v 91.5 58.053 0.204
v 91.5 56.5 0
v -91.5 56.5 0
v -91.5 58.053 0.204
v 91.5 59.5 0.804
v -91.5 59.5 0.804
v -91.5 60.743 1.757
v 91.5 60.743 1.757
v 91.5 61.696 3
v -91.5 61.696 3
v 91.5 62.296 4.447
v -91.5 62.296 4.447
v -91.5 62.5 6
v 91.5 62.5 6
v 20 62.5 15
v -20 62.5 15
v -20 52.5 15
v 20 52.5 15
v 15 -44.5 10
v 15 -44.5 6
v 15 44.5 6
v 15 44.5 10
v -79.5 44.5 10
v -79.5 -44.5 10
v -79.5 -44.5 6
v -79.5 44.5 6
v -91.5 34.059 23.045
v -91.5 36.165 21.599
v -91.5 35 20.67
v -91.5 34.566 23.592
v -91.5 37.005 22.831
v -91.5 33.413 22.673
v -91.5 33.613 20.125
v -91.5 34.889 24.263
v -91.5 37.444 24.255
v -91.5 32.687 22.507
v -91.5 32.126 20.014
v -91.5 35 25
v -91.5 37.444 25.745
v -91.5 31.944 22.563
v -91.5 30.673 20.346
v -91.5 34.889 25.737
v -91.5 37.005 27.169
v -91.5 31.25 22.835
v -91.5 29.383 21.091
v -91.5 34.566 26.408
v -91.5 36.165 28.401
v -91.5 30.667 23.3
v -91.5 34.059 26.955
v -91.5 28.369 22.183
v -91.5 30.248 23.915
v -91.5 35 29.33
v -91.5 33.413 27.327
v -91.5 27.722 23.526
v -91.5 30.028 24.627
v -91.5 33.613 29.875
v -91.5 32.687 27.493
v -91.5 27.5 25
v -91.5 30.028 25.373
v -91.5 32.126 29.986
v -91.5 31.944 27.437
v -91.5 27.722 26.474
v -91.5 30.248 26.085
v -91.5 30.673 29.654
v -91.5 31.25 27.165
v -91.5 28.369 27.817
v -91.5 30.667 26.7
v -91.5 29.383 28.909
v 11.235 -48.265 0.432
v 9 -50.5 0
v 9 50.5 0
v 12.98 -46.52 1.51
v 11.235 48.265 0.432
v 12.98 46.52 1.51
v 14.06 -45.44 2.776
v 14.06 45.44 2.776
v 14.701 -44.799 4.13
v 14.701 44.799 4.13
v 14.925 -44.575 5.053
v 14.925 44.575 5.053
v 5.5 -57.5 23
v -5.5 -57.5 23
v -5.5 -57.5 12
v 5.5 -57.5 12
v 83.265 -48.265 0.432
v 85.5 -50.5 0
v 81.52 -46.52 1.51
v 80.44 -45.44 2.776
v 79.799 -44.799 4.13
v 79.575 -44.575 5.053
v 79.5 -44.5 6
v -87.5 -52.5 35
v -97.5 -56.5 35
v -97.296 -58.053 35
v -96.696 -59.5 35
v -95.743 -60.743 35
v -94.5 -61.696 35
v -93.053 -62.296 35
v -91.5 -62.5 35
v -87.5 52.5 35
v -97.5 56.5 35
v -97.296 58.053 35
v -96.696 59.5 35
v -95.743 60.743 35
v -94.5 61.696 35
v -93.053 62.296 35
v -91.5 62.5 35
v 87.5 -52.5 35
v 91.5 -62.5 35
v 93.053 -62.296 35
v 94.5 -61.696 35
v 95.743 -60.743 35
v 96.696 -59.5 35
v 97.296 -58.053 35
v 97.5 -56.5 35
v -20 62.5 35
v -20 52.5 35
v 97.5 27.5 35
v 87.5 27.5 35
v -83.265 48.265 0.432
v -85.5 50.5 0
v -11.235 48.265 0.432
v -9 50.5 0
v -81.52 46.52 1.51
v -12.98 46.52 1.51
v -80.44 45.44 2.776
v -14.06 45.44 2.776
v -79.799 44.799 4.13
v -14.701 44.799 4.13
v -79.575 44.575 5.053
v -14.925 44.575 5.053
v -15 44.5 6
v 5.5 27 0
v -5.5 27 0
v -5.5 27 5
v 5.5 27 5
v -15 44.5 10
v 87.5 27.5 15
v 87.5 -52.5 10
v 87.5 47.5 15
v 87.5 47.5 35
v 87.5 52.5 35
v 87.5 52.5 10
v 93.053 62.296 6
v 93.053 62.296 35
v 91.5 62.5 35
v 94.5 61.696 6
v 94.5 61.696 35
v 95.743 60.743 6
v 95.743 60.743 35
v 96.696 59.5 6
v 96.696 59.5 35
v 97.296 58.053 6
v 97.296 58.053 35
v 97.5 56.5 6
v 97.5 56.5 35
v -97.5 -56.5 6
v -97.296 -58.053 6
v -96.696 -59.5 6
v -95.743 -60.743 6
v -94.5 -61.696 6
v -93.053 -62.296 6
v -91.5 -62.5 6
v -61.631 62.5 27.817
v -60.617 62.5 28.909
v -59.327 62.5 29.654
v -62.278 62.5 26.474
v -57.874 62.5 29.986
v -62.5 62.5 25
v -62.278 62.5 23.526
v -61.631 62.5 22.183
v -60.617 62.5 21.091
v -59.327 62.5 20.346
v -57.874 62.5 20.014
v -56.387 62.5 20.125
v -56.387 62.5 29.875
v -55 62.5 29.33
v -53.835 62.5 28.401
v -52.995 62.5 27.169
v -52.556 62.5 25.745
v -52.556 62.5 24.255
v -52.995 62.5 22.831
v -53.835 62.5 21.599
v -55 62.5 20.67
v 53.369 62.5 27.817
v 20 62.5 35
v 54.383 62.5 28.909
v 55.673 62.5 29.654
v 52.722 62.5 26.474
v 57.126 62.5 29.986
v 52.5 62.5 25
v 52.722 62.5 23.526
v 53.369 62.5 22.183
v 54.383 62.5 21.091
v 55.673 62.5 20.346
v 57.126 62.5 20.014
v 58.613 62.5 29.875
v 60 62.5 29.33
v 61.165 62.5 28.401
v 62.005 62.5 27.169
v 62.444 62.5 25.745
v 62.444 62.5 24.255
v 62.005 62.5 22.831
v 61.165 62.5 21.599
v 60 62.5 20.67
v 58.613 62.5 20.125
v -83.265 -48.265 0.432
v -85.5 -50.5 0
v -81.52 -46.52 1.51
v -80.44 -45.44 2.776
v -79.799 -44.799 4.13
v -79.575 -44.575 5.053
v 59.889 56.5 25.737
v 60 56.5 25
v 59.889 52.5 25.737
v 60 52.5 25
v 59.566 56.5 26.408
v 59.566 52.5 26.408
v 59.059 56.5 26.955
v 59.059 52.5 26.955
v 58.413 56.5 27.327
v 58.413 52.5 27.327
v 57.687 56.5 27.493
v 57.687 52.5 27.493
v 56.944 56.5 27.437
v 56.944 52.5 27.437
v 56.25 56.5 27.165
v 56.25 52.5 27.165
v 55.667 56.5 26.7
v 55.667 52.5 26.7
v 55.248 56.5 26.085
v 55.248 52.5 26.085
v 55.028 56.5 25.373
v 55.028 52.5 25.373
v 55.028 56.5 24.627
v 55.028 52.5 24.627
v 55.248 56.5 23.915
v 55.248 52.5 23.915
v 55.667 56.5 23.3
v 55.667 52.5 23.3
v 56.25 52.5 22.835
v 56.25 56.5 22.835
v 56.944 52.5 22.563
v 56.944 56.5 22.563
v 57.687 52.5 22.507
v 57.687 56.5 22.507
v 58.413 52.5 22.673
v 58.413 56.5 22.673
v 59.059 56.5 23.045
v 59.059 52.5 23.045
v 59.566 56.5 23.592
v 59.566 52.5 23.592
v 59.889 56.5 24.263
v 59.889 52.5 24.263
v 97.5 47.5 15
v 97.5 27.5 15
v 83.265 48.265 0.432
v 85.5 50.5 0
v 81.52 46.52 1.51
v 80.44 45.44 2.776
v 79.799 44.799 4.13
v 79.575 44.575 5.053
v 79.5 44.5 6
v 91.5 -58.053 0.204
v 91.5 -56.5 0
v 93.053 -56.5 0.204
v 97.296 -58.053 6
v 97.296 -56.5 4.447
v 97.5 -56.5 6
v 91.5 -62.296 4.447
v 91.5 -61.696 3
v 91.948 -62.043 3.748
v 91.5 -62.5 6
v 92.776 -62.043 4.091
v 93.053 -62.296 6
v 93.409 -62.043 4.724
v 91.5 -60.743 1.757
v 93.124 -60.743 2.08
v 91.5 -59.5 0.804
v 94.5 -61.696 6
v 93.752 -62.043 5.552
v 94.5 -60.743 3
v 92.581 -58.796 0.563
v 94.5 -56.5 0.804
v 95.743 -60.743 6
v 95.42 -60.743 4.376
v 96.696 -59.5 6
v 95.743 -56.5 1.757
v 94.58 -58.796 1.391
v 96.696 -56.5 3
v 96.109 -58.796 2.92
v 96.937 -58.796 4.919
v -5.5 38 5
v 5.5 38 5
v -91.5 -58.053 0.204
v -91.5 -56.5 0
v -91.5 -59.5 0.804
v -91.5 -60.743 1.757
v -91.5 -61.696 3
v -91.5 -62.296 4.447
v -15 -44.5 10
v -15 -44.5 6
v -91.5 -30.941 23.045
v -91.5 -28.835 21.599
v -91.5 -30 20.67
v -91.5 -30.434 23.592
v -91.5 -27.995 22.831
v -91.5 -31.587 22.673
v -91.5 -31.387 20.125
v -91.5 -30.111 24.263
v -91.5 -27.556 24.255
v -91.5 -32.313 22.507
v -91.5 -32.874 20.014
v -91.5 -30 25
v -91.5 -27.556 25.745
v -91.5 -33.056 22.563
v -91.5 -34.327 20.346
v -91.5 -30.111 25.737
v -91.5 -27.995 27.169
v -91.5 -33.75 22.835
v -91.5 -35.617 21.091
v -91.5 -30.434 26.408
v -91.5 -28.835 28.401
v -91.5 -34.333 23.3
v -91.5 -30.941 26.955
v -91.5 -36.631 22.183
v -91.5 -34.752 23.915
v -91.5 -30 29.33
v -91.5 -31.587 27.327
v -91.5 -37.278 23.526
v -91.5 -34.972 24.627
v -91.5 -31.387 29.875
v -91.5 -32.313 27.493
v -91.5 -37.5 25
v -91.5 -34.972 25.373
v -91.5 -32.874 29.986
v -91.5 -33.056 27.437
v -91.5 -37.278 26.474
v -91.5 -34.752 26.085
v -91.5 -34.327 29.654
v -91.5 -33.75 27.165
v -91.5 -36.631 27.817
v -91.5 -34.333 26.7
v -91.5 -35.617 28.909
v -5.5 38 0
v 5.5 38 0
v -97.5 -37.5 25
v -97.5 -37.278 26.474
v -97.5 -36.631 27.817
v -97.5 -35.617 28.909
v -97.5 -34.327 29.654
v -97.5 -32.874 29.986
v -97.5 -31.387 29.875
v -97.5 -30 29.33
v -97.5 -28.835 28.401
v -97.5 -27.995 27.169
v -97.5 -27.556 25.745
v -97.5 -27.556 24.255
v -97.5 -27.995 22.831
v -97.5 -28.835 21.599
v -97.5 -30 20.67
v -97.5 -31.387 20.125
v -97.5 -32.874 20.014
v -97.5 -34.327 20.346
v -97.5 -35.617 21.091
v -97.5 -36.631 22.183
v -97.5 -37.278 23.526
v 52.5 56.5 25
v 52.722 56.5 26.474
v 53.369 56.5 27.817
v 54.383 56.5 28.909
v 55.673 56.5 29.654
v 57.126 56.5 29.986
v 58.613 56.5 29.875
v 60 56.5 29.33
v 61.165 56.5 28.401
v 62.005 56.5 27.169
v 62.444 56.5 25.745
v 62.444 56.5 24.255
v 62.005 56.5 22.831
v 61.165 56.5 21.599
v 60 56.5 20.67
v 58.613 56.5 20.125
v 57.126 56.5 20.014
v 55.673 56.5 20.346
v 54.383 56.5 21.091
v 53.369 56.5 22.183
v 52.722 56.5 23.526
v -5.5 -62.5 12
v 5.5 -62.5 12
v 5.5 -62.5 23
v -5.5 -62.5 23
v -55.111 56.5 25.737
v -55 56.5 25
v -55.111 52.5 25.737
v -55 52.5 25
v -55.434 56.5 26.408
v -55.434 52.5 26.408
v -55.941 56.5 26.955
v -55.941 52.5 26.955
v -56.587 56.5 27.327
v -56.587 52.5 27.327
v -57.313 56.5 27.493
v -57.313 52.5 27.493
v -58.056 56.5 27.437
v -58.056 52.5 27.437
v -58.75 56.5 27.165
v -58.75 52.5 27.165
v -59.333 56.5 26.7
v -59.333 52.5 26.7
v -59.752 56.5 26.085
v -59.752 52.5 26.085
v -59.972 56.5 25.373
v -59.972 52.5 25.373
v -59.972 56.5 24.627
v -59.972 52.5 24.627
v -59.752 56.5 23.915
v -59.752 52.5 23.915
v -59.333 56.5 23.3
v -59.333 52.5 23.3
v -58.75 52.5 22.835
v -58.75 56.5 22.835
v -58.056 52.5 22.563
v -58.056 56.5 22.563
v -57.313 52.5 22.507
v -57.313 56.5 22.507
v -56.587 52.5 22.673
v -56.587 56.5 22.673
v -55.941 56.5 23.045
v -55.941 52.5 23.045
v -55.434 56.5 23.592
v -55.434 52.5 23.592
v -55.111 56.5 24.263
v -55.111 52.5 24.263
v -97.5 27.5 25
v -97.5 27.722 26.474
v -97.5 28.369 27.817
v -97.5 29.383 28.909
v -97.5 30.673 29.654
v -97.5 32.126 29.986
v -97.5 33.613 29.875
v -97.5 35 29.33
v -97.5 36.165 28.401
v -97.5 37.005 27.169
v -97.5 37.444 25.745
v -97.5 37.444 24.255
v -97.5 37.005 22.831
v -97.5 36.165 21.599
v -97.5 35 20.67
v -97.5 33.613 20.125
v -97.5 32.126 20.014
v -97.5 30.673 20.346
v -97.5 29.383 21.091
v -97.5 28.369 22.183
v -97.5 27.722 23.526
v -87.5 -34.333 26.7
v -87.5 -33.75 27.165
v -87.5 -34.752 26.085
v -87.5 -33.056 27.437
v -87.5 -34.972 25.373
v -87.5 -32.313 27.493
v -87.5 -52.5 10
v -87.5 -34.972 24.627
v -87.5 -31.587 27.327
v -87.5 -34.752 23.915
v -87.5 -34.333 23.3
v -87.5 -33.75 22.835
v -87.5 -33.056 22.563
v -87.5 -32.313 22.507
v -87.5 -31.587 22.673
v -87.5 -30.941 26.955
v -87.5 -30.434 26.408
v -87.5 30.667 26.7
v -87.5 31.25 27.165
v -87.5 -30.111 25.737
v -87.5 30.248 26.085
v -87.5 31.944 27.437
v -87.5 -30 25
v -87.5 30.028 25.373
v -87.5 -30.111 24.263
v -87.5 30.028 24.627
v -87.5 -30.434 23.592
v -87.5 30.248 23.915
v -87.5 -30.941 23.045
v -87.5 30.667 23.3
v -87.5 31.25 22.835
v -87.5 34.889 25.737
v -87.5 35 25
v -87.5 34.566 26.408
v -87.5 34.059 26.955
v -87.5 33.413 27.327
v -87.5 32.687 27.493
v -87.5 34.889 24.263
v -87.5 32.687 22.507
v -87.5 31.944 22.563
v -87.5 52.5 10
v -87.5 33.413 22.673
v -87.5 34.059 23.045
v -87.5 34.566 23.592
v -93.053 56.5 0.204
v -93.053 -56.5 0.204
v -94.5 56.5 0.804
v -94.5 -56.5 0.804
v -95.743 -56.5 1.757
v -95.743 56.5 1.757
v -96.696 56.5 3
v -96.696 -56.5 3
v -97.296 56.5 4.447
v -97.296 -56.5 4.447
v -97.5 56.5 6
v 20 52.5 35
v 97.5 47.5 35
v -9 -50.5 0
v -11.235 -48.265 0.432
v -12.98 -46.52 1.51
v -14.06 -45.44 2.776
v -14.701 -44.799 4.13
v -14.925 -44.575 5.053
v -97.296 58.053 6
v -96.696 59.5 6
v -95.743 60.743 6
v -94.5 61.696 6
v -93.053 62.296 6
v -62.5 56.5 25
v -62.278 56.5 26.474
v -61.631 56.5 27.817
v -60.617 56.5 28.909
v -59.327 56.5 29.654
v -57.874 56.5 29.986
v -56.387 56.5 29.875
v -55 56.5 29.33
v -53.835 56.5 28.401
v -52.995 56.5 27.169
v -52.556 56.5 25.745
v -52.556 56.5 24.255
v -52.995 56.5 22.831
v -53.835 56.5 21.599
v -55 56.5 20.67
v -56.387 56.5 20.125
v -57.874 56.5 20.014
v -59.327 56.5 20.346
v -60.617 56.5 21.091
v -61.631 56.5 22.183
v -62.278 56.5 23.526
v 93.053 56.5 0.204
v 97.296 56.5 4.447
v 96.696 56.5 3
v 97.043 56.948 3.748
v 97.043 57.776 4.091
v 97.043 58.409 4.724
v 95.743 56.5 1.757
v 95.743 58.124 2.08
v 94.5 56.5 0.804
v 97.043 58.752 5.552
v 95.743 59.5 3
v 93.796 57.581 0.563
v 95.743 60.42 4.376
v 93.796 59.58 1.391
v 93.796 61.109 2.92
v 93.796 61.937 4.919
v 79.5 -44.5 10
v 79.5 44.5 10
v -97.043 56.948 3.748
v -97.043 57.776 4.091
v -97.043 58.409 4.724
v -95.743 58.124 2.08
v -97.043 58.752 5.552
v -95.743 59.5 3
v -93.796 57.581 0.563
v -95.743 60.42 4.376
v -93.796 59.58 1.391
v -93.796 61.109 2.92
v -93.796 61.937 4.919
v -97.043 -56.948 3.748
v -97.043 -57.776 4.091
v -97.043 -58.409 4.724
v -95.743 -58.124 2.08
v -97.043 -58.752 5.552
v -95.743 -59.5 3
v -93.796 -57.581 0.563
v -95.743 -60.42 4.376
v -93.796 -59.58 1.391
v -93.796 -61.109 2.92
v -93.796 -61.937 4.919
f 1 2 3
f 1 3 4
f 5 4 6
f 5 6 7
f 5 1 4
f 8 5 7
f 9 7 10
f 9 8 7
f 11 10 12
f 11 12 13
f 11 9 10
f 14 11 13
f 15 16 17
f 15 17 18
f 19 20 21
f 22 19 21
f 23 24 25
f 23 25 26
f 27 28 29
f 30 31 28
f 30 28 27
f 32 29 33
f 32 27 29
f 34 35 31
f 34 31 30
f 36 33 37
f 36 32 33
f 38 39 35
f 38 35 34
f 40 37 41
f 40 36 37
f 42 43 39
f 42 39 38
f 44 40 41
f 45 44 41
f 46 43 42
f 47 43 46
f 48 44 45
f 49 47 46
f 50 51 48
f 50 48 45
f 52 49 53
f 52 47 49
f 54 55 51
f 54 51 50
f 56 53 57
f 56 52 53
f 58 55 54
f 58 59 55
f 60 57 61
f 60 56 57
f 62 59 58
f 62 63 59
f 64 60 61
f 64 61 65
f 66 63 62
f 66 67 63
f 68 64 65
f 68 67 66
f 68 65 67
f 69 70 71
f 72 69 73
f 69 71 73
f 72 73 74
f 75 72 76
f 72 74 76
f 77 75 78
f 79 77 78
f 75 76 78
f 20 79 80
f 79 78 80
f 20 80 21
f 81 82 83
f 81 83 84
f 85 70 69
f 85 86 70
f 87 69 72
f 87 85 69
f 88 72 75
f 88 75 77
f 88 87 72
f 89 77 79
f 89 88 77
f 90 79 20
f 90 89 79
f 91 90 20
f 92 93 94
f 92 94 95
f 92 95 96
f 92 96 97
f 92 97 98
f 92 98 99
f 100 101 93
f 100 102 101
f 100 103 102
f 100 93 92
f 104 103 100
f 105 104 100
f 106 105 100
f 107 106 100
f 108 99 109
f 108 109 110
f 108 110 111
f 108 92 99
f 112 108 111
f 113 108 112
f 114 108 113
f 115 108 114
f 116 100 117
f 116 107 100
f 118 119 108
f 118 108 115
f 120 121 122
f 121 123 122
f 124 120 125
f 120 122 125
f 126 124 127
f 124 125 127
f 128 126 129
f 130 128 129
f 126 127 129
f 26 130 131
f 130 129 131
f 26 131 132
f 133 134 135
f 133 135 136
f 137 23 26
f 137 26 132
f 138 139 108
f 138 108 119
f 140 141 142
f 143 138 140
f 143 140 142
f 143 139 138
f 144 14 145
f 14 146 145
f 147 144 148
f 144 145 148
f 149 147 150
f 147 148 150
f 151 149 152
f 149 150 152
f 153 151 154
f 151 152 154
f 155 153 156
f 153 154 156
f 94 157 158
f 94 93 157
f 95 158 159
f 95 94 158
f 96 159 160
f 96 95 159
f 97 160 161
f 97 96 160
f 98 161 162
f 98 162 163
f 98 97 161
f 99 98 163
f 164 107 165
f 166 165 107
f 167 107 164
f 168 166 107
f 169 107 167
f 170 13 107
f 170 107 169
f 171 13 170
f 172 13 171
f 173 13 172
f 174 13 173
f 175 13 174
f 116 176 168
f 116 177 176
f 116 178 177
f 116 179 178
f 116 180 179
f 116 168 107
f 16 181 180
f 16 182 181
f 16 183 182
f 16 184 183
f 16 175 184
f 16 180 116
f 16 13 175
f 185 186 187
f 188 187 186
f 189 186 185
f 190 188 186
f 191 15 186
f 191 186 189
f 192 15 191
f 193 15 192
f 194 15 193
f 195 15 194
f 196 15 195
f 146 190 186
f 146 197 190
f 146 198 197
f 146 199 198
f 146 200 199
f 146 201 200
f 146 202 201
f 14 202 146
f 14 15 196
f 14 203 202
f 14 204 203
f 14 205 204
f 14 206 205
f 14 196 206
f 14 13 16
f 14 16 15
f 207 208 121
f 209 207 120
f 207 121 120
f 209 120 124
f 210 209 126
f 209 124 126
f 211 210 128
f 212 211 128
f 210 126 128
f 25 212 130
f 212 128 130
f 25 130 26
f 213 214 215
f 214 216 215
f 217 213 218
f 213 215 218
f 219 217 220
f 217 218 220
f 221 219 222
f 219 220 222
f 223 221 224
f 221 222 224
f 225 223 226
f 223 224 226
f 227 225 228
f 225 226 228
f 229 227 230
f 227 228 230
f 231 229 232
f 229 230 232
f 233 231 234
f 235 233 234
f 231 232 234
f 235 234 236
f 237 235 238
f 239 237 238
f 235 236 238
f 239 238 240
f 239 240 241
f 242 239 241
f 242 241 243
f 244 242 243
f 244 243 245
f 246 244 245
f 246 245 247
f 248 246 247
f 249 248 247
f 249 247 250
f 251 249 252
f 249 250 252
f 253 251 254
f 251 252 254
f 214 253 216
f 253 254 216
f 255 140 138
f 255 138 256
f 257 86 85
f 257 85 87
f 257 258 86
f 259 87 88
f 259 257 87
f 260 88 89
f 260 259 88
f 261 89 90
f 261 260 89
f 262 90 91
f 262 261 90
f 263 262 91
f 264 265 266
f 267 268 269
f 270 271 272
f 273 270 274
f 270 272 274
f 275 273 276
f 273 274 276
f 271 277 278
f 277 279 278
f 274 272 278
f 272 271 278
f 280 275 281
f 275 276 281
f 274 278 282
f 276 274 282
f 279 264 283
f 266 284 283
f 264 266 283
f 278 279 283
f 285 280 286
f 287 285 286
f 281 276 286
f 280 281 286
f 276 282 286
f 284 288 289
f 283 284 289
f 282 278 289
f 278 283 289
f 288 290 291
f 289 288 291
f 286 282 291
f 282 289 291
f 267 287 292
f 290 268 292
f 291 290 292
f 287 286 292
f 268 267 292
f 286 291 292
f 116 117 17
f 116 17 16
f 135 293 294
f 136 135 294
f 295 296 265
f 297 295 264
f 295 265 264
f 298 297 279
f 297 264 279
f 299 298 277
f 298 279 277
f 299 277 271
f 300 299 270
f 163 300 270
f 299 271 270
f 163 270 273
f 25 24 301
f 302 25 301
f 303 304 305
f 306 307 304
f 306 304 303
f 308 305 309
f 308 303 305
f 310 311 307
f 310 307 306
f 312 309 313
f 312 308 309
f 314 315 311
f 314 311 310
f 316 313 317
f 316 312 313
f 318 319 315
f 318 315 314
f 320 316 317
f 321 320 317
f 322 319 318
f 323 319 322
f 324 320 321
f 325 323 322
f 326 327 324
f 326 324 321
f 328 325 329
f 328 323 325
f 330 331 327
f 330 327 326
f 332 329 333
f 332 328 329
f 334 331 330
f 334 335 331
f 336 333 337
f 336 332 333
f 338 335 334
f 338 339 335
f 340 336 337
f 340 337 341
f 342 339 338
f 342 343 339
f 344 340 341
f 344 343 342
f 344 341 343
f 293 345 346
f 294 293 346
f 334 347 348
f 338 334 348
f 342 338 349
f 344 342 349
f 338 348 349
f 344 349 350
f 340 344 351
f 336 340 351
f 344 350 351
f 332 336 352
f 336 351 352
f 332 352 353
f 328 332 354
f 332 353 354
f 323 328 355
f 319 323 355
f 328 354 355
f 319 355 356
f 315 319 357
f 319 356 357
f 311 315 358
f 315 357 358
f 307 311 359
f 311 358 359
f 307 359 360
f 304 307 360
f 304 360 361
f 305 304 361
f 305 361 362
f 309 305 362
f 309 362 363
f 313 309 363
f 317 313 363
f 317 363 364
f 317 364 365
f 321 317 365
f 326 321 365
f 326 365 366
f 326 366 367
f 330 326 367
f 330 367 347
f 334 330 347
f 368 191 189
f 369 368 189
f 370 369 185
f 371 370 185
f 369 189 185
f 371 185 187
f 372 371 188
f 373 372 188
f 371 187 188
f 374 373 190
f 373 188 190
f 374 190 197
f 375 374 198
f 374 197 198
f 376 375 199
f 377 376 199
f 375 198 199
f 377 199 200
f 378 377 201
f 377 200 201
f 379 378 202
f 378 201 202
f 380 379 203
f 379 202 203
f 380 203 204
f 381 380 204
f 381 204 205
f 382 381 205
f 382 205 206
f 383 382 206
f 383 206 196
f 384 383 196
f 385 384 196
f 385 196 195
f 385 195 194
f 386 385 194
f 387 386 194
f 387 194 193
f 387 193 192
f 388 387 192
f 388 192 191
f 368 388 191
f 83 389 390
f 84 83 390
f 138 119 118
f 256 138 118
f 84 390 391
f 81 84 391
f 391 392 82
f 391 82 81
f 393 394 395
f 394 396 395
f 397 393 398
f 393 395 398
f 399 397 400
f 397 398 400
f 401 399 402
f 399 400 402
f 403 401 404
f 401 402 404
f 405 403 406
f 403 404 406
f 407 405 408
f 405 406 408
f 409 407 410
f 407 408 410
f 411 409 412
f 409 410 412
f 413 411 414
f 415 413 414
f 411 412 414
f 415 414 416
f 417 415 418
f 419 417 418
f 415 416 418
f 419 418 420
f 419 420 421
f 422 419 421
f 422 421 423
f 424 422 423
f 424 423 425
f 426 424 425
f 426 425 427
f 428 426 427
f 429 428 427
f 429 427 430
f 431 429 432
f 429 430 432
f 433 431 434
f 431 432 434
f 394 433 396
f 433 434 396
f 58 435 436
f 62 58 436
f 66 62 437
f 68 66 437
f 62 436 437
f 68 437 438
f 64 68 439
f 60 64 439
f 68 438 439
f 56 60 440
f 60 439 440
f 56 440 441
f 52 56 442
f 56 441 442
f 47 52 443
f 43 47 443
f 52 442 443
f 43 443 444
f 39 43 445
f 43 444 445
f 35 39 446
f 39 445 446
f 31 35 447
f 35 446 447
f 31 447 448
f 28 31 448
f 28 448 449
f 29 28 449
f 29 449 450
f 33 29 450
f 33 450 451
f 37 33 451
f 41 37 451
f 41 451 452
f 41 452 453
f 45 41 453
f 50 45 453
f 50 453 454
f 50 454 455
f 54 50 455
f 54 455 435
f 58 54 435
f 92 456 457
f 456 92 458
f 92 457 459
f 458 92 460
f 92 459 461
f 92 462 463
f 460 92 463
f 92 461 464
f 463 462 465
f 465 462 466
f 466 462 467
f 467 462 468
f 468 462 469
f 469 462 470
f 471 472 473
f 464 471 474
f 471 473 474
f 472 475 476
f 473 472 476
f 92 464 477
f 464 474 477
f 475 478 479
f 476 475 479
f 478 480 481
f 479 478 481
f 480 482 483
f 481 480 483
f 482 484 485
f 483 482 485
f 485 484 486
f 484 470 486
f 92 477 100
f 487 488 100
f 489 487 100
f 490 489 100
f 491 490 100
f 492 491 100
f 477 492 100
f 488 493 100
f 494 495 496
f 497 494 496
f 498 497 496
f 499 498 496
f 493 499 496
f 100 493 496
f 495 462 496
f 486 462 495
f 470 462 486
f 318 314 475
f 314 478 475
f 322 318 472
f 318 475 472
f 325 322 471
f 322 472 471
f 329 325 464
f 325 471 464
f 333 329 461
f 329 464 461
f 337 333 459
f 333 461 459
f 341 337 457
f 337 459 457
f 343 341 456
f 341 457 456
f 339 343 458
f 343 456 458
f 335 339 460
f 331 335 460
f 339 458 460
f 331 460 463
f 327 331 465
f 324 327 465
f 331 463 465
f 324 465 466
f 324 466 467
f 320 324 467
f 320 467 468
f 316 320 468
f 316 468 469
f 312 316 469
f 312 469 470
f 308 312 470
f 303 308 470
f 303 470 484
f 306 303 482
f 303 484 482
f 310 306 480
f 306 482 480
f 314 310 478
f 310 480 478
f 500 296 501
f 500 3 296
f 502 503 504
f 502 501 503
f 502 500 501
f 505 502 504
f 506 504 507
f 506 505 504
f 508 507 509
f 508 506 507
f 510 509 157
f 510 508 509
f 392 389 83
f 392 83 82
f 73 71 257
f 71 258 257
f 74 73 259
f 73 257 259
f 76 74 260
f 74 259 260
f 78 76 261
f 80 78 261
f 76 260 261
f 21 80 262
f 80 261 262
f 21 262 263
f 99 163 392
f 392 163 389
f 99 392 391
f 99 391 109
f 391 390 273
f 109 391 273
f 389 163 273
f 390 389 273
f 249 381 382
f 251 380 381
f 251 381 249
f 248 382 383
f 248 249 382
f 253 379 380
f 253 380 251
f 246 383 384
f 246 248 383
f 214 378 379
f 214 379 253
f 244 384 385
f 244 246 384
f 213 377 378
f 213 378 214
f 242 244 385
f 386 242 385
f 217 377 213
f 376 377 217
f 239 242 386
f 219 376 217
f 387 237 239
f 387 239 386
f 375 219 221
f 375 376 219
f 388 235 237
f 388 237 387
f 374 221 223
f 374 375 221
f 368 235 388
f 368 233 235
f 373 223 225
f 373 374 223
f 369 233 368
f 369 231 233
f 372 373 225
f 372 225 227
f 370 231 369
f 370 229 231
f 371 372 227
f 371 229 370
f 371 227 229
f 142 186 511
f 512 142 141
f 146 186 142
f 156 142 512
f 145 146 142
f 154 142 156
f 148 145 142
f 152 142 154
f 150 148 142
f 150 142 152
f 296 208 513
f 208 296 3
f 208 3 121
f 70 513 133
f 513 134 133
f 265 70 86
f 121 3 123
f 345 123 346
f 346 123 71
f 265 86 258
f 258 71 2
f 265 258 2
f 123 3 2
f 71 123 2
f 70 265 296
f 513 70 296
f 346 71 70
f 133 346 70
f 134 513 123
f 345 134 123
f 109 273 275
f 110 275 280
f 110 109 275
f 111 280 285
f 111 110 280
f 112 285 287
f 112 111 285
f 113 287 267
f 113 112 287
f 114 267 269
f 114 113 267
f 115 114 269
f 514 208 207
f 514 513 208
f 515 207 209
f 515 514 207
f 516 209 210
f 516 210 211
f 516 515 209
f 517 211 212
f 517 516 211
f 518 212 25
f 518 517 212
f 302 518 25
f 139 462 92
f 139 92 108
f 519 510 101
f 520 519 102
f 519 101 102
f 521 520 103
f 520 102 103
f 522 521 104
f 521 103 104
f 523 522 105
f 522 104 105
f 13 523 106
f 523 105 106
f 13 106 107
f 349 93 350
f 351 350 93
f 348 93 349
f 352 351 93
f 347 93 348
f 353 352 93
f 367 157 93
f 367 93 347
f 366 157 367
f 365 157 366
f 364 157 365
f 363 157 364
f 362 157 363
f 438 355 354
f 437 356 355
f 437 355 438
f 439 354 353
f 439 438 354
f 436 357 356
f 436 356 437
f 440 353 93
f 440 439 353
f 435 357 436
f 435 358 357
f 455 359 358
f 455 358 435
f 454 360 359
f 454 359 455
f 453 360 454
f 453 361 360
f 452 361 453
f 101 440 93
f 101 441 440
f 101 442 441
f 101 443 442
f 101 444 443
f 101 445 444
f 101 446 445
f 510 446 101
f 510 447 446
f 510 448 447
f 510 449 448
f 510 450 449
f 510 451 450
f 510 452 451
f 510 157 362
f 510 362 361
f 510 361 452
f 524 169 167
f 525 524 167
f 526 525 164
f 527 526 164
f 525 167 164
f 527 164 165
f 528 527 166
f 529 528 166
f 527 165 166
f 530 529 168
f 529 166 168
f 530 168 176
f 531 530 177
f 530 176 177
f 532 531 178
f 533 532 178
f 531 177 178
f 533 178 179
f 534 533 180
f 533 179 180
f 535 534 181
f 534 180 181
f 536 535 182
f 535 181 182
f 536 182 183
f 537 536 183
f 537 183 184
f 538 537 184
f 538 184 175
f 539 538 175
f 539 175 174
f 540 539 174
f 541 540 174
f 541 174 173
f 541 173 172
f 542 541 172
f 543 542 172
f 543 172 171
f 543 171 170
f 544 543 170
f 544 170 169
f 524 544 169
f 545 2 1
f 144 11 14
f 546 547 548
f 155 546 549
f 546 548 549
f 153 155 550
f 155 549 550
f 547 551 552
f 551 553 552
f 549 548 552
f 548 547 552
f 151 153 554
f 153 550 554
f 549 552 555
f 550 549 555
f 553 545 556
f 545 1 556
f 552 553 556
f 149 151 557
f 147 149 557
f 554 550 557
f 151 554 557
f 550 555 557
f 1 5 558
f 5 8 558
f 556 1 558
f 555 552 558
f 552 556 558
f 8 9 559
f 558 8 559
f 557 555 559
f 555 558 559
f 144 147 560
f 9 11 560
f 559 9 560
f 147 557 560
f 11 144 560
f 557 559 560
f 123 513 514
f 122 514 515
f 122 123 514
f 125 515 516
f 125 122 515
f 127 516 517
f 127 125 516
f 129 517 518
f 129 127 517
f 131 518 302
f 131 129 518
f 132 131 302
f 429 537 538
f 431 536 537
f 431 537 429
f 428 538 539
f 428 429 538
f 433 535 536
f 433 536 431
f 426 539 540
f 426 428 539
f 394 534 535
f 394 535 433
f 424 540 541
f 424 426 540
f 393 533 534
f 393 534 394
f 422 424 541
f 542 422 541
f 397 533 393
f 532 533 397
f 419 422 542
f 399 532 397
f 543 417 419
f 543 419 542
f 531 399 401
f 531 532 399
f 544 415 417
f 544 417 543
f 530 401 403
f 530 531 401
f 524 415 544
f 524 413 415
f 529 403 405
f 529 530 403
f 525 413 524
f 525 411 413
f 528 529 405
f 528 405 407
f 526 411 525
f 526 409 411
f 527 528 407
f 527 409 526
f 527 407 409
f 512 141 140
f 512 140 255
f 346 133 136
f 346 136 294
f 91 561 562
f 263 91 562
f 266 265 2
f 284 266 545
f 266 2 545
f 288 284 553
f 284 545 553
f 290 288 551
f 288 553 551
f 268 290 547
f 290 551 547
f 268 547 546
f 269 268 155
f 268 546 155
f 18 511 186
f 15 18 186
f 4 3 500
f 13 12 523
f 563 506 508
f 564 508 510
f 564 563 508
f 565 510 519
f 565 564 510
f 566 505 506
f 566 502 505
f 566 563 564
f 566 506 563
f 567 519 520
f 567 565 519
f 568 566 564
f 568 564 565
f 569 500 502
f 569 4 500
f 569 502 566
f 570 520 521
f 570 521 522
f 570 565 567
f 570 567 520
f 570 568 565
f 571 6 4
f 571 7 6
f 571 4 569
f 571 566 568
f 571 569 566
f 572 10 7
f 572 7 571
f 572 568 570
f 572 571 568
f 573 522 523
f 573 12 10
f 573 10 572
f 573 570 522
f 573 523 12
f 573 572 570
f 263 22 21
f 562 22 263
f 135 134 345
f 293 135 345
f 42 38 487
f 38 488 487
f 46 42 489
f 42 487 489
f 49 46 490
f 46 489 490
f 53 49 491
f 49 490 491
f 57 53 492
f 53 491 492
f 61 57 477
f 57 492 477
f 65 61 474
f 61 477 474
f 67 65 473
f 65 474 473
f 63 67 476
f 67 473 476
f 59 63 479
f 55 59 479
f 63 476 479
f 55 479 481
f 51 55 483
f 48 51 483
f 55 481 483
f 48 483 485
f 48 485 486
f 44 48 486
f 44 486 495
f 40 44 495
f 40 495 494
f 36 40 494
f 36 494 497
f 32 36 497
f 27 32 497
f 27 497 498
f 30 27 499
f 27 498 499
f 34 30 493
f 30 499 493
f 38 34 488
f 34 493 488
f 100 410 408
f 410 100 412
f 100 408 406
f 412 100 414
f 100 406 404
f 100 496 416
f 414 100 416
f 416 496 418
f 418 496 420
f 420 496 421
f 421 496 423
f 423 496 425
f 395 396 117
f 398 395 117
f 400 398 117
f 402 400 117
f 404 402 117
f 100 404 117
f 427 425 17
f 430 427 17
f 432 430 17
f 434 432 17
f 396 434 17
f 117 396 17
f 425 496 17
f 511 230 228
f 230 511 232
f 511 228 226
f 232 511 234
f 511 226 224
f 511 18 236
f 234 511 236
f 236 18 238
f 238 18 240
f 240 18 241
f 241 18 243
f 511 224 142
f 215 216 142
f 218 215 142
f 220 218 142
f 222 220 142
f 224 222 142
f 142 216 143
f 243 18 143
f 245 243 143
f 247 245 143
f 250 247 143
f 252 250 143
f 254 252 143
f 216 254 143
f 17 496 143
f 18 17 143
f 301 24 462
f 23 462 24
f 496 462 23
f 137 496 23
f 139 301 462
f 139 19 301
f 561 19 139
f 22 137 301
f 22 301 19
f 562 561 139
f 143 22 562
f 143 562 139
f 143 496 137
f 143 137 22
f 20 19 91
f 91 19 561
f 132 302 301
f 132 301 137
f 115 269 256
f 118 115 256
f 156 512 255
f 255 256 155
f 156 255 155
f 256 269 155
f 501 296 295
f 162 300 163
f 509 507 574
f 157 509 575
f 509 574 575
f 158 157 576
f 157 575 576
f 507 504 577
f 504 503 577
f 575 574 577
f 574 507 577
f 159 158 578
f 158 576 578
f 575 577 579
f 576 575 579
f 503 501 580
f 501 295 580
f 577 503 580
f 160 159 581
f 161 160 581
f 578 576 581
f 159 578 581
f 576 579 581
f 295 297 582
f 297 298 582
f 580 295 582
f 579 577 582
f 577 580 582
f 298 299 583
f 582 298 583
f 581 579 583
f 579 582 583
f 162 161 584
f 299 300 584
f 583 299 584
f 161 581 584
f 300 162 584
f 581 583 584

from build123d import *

# Parameters (mm, degrees)
F0_W            = 195
F0_H            = 125
F0_W_2          = 175
F0_H_2          = 105
F1_DEPTH        = 35
F2_DEPTH        = 10
F3_W            = 40
F3_H            = 10
F3_W_2          = 10
F3_H_2          = 20
F4_DEPTH        = 20
F5_W            = 159
F5_H            = 89
F6_DEPTH        = 25
F8_W            = 30
F8_H            = 110
F9_DEPTH        = 10
F10_W           = 11
F10_H           = 11
F11_DEPTH       = 5
F12_DEPTH       = 5
F15_D           = 5
F15_DEPTH       = 12
F15_CBORE_D     = 10
F15_CBORE_DEPTH = 6
F15_TIP         = 1.5021515476
F16_D           = 5
F16_DEPTH       = 12
F16_CBORE_D     = 10
F16_CBORE_DEPTH = 6
F16_TIP         = 1.5021515476
F17_R           = 6
F18_R           = 6
F7_W            = 11
F7_H            = 11
F19_DEPTH       = 5


with BuildPart() as f1:
    # F0 (on Top) → F1 (new body)
    with BuildSketch(Plane.XY):
        Rectangle(F0_W, F0_H)
        Rectangle(F0_W_2, F0_H_2, mode=Mode.SUBTRACT)
    extrude(amount=F1_DEPTH)

    # F0 (on Top) → F2 (join)
    with BuildSketch(Plane.XY):
        Rectangle(F0_W_2, F0_H_2)
    extrude(amount=F2_DEPTH)

    # F3 (on face) → F4 (cut)
    with BuildSketch(Plane.XY.offset(35)):
        with Locations((0, 57.5)):
            Rectangle(F3_W, F3_H)
        with Locations((92.5, 37.5)):
            Rectangle(F3_W_2, F3_H_2)
    extrude(amount=-F4_DEPTH, mode=Mode.SUBTRACT)

    # F5 (on face) → F6 (cut)
    with BuildSketch(Plane.XY.offset(10)):
        Rectangle(F5_W, F5_H)
    extrude(amount=-F6_DEPTH, mode=Mode.SUBTRACT)

    # F8 (on Top) → F9 (join)
    with BuildSketch(Plane.XY):
        Rectangle(F8_W, F8_H)
    extrude(amount=F9_DEPTH)

    # F10 (on Top) → F11 (cut)
    with BuildSketch(Plane.XY):
        with Locations((0, 32.5)):
            Rectangle(F10_W, F10_H)
    extrude(amount=-F11_DEPTH, mode=Mode.SUBTRACT)

    # F10 (on Top) → F12 (cut)
    with BuildSketch(Plane.XY):
        with Locations((0, 32.5)):
            Rectangle(F10_W, F10_H)
    extrude(amount=F12_DEPTH, mode=Mode.SUBTRACT)

    # F15
    with Locations(Plane(origin=(-97.5, 0, 0), x_dir=(0, -1, 0), z_dir=(-1, 0, 0))):
        with Locations((-32.5, 25), (32.5, 25)):
            CounterBoreHole(F15_D / 2, F15_CBORE_D / 2, F15_CBORE_DEPTH, depth=F15_DEPTH)
            with Locations((0, 0, -(F15_DEPTH + F15_TIP / 2))):  # 118° drill point
                Cone(0, F15_D / 2, F15_TIP, mode=Mode.SUBTRACT)

    # F16
    with Locations(Plane(origin=(0, 62.5, 0), x_dir=(-1, 0, 0), z_dir=(0, 1, 0))):
        with Locations((-57.5, 25), (57.5, 25)):
            CounterBoreHole(F16_D / 2, F16_CBORE_D / 2, F16_CBORE_DEPTH, depth=F16_DEPTH)
            with Locations((0, 0, -(F16_DEPTH + F16_TIP / 2))):  # 118° drill point
                Cone(0, F16_D / 2, F16_TIP, mode=Mode.SUBTRACT)

    # F17
    f17_edges = [f1.edges().sort_by_distance(p)[0] for p in [
        (79.5, 0, 0),
        (47.25, 44.5, 0),
        (15, 0, 0),
        (47.25, -44.5, 0),
        (-15, 0, 0),
        (-47.25, 44.5, 0),
        (-79.5, 0, 0),
        (-47.25, -44.5, 0),
    ]]
    fillet(f17_edges, radius=F17_R)

    # F18
    f18_edges = [f1.edges().sort_by_distance(p)[0] for p in [
        (0, 62.5, 0),
        (97.5, 0, 0),
        (0, -62.5, 0),
        (-97.5, 0, 0),
        (-97.5, 62.5, 17.5),
        (97.5, 62.5, 17.5),
        (97.5, -62.5, 17.5),
        (-97.5, -62.5, 17.5),
    ]]
    fillet(f18_edges, radius=F18_R)

    # F7 (on face) → F19 (cut)
    with BuildSketch(Plane.XZ.offset(62.5)):
        with Locations((0, 17.5)):
            Rectangle(F7_W, F7_H)
    extrude(amount=-F19_DEPTH, mode=Mode.SUBTRACT)


solid = f1.part
